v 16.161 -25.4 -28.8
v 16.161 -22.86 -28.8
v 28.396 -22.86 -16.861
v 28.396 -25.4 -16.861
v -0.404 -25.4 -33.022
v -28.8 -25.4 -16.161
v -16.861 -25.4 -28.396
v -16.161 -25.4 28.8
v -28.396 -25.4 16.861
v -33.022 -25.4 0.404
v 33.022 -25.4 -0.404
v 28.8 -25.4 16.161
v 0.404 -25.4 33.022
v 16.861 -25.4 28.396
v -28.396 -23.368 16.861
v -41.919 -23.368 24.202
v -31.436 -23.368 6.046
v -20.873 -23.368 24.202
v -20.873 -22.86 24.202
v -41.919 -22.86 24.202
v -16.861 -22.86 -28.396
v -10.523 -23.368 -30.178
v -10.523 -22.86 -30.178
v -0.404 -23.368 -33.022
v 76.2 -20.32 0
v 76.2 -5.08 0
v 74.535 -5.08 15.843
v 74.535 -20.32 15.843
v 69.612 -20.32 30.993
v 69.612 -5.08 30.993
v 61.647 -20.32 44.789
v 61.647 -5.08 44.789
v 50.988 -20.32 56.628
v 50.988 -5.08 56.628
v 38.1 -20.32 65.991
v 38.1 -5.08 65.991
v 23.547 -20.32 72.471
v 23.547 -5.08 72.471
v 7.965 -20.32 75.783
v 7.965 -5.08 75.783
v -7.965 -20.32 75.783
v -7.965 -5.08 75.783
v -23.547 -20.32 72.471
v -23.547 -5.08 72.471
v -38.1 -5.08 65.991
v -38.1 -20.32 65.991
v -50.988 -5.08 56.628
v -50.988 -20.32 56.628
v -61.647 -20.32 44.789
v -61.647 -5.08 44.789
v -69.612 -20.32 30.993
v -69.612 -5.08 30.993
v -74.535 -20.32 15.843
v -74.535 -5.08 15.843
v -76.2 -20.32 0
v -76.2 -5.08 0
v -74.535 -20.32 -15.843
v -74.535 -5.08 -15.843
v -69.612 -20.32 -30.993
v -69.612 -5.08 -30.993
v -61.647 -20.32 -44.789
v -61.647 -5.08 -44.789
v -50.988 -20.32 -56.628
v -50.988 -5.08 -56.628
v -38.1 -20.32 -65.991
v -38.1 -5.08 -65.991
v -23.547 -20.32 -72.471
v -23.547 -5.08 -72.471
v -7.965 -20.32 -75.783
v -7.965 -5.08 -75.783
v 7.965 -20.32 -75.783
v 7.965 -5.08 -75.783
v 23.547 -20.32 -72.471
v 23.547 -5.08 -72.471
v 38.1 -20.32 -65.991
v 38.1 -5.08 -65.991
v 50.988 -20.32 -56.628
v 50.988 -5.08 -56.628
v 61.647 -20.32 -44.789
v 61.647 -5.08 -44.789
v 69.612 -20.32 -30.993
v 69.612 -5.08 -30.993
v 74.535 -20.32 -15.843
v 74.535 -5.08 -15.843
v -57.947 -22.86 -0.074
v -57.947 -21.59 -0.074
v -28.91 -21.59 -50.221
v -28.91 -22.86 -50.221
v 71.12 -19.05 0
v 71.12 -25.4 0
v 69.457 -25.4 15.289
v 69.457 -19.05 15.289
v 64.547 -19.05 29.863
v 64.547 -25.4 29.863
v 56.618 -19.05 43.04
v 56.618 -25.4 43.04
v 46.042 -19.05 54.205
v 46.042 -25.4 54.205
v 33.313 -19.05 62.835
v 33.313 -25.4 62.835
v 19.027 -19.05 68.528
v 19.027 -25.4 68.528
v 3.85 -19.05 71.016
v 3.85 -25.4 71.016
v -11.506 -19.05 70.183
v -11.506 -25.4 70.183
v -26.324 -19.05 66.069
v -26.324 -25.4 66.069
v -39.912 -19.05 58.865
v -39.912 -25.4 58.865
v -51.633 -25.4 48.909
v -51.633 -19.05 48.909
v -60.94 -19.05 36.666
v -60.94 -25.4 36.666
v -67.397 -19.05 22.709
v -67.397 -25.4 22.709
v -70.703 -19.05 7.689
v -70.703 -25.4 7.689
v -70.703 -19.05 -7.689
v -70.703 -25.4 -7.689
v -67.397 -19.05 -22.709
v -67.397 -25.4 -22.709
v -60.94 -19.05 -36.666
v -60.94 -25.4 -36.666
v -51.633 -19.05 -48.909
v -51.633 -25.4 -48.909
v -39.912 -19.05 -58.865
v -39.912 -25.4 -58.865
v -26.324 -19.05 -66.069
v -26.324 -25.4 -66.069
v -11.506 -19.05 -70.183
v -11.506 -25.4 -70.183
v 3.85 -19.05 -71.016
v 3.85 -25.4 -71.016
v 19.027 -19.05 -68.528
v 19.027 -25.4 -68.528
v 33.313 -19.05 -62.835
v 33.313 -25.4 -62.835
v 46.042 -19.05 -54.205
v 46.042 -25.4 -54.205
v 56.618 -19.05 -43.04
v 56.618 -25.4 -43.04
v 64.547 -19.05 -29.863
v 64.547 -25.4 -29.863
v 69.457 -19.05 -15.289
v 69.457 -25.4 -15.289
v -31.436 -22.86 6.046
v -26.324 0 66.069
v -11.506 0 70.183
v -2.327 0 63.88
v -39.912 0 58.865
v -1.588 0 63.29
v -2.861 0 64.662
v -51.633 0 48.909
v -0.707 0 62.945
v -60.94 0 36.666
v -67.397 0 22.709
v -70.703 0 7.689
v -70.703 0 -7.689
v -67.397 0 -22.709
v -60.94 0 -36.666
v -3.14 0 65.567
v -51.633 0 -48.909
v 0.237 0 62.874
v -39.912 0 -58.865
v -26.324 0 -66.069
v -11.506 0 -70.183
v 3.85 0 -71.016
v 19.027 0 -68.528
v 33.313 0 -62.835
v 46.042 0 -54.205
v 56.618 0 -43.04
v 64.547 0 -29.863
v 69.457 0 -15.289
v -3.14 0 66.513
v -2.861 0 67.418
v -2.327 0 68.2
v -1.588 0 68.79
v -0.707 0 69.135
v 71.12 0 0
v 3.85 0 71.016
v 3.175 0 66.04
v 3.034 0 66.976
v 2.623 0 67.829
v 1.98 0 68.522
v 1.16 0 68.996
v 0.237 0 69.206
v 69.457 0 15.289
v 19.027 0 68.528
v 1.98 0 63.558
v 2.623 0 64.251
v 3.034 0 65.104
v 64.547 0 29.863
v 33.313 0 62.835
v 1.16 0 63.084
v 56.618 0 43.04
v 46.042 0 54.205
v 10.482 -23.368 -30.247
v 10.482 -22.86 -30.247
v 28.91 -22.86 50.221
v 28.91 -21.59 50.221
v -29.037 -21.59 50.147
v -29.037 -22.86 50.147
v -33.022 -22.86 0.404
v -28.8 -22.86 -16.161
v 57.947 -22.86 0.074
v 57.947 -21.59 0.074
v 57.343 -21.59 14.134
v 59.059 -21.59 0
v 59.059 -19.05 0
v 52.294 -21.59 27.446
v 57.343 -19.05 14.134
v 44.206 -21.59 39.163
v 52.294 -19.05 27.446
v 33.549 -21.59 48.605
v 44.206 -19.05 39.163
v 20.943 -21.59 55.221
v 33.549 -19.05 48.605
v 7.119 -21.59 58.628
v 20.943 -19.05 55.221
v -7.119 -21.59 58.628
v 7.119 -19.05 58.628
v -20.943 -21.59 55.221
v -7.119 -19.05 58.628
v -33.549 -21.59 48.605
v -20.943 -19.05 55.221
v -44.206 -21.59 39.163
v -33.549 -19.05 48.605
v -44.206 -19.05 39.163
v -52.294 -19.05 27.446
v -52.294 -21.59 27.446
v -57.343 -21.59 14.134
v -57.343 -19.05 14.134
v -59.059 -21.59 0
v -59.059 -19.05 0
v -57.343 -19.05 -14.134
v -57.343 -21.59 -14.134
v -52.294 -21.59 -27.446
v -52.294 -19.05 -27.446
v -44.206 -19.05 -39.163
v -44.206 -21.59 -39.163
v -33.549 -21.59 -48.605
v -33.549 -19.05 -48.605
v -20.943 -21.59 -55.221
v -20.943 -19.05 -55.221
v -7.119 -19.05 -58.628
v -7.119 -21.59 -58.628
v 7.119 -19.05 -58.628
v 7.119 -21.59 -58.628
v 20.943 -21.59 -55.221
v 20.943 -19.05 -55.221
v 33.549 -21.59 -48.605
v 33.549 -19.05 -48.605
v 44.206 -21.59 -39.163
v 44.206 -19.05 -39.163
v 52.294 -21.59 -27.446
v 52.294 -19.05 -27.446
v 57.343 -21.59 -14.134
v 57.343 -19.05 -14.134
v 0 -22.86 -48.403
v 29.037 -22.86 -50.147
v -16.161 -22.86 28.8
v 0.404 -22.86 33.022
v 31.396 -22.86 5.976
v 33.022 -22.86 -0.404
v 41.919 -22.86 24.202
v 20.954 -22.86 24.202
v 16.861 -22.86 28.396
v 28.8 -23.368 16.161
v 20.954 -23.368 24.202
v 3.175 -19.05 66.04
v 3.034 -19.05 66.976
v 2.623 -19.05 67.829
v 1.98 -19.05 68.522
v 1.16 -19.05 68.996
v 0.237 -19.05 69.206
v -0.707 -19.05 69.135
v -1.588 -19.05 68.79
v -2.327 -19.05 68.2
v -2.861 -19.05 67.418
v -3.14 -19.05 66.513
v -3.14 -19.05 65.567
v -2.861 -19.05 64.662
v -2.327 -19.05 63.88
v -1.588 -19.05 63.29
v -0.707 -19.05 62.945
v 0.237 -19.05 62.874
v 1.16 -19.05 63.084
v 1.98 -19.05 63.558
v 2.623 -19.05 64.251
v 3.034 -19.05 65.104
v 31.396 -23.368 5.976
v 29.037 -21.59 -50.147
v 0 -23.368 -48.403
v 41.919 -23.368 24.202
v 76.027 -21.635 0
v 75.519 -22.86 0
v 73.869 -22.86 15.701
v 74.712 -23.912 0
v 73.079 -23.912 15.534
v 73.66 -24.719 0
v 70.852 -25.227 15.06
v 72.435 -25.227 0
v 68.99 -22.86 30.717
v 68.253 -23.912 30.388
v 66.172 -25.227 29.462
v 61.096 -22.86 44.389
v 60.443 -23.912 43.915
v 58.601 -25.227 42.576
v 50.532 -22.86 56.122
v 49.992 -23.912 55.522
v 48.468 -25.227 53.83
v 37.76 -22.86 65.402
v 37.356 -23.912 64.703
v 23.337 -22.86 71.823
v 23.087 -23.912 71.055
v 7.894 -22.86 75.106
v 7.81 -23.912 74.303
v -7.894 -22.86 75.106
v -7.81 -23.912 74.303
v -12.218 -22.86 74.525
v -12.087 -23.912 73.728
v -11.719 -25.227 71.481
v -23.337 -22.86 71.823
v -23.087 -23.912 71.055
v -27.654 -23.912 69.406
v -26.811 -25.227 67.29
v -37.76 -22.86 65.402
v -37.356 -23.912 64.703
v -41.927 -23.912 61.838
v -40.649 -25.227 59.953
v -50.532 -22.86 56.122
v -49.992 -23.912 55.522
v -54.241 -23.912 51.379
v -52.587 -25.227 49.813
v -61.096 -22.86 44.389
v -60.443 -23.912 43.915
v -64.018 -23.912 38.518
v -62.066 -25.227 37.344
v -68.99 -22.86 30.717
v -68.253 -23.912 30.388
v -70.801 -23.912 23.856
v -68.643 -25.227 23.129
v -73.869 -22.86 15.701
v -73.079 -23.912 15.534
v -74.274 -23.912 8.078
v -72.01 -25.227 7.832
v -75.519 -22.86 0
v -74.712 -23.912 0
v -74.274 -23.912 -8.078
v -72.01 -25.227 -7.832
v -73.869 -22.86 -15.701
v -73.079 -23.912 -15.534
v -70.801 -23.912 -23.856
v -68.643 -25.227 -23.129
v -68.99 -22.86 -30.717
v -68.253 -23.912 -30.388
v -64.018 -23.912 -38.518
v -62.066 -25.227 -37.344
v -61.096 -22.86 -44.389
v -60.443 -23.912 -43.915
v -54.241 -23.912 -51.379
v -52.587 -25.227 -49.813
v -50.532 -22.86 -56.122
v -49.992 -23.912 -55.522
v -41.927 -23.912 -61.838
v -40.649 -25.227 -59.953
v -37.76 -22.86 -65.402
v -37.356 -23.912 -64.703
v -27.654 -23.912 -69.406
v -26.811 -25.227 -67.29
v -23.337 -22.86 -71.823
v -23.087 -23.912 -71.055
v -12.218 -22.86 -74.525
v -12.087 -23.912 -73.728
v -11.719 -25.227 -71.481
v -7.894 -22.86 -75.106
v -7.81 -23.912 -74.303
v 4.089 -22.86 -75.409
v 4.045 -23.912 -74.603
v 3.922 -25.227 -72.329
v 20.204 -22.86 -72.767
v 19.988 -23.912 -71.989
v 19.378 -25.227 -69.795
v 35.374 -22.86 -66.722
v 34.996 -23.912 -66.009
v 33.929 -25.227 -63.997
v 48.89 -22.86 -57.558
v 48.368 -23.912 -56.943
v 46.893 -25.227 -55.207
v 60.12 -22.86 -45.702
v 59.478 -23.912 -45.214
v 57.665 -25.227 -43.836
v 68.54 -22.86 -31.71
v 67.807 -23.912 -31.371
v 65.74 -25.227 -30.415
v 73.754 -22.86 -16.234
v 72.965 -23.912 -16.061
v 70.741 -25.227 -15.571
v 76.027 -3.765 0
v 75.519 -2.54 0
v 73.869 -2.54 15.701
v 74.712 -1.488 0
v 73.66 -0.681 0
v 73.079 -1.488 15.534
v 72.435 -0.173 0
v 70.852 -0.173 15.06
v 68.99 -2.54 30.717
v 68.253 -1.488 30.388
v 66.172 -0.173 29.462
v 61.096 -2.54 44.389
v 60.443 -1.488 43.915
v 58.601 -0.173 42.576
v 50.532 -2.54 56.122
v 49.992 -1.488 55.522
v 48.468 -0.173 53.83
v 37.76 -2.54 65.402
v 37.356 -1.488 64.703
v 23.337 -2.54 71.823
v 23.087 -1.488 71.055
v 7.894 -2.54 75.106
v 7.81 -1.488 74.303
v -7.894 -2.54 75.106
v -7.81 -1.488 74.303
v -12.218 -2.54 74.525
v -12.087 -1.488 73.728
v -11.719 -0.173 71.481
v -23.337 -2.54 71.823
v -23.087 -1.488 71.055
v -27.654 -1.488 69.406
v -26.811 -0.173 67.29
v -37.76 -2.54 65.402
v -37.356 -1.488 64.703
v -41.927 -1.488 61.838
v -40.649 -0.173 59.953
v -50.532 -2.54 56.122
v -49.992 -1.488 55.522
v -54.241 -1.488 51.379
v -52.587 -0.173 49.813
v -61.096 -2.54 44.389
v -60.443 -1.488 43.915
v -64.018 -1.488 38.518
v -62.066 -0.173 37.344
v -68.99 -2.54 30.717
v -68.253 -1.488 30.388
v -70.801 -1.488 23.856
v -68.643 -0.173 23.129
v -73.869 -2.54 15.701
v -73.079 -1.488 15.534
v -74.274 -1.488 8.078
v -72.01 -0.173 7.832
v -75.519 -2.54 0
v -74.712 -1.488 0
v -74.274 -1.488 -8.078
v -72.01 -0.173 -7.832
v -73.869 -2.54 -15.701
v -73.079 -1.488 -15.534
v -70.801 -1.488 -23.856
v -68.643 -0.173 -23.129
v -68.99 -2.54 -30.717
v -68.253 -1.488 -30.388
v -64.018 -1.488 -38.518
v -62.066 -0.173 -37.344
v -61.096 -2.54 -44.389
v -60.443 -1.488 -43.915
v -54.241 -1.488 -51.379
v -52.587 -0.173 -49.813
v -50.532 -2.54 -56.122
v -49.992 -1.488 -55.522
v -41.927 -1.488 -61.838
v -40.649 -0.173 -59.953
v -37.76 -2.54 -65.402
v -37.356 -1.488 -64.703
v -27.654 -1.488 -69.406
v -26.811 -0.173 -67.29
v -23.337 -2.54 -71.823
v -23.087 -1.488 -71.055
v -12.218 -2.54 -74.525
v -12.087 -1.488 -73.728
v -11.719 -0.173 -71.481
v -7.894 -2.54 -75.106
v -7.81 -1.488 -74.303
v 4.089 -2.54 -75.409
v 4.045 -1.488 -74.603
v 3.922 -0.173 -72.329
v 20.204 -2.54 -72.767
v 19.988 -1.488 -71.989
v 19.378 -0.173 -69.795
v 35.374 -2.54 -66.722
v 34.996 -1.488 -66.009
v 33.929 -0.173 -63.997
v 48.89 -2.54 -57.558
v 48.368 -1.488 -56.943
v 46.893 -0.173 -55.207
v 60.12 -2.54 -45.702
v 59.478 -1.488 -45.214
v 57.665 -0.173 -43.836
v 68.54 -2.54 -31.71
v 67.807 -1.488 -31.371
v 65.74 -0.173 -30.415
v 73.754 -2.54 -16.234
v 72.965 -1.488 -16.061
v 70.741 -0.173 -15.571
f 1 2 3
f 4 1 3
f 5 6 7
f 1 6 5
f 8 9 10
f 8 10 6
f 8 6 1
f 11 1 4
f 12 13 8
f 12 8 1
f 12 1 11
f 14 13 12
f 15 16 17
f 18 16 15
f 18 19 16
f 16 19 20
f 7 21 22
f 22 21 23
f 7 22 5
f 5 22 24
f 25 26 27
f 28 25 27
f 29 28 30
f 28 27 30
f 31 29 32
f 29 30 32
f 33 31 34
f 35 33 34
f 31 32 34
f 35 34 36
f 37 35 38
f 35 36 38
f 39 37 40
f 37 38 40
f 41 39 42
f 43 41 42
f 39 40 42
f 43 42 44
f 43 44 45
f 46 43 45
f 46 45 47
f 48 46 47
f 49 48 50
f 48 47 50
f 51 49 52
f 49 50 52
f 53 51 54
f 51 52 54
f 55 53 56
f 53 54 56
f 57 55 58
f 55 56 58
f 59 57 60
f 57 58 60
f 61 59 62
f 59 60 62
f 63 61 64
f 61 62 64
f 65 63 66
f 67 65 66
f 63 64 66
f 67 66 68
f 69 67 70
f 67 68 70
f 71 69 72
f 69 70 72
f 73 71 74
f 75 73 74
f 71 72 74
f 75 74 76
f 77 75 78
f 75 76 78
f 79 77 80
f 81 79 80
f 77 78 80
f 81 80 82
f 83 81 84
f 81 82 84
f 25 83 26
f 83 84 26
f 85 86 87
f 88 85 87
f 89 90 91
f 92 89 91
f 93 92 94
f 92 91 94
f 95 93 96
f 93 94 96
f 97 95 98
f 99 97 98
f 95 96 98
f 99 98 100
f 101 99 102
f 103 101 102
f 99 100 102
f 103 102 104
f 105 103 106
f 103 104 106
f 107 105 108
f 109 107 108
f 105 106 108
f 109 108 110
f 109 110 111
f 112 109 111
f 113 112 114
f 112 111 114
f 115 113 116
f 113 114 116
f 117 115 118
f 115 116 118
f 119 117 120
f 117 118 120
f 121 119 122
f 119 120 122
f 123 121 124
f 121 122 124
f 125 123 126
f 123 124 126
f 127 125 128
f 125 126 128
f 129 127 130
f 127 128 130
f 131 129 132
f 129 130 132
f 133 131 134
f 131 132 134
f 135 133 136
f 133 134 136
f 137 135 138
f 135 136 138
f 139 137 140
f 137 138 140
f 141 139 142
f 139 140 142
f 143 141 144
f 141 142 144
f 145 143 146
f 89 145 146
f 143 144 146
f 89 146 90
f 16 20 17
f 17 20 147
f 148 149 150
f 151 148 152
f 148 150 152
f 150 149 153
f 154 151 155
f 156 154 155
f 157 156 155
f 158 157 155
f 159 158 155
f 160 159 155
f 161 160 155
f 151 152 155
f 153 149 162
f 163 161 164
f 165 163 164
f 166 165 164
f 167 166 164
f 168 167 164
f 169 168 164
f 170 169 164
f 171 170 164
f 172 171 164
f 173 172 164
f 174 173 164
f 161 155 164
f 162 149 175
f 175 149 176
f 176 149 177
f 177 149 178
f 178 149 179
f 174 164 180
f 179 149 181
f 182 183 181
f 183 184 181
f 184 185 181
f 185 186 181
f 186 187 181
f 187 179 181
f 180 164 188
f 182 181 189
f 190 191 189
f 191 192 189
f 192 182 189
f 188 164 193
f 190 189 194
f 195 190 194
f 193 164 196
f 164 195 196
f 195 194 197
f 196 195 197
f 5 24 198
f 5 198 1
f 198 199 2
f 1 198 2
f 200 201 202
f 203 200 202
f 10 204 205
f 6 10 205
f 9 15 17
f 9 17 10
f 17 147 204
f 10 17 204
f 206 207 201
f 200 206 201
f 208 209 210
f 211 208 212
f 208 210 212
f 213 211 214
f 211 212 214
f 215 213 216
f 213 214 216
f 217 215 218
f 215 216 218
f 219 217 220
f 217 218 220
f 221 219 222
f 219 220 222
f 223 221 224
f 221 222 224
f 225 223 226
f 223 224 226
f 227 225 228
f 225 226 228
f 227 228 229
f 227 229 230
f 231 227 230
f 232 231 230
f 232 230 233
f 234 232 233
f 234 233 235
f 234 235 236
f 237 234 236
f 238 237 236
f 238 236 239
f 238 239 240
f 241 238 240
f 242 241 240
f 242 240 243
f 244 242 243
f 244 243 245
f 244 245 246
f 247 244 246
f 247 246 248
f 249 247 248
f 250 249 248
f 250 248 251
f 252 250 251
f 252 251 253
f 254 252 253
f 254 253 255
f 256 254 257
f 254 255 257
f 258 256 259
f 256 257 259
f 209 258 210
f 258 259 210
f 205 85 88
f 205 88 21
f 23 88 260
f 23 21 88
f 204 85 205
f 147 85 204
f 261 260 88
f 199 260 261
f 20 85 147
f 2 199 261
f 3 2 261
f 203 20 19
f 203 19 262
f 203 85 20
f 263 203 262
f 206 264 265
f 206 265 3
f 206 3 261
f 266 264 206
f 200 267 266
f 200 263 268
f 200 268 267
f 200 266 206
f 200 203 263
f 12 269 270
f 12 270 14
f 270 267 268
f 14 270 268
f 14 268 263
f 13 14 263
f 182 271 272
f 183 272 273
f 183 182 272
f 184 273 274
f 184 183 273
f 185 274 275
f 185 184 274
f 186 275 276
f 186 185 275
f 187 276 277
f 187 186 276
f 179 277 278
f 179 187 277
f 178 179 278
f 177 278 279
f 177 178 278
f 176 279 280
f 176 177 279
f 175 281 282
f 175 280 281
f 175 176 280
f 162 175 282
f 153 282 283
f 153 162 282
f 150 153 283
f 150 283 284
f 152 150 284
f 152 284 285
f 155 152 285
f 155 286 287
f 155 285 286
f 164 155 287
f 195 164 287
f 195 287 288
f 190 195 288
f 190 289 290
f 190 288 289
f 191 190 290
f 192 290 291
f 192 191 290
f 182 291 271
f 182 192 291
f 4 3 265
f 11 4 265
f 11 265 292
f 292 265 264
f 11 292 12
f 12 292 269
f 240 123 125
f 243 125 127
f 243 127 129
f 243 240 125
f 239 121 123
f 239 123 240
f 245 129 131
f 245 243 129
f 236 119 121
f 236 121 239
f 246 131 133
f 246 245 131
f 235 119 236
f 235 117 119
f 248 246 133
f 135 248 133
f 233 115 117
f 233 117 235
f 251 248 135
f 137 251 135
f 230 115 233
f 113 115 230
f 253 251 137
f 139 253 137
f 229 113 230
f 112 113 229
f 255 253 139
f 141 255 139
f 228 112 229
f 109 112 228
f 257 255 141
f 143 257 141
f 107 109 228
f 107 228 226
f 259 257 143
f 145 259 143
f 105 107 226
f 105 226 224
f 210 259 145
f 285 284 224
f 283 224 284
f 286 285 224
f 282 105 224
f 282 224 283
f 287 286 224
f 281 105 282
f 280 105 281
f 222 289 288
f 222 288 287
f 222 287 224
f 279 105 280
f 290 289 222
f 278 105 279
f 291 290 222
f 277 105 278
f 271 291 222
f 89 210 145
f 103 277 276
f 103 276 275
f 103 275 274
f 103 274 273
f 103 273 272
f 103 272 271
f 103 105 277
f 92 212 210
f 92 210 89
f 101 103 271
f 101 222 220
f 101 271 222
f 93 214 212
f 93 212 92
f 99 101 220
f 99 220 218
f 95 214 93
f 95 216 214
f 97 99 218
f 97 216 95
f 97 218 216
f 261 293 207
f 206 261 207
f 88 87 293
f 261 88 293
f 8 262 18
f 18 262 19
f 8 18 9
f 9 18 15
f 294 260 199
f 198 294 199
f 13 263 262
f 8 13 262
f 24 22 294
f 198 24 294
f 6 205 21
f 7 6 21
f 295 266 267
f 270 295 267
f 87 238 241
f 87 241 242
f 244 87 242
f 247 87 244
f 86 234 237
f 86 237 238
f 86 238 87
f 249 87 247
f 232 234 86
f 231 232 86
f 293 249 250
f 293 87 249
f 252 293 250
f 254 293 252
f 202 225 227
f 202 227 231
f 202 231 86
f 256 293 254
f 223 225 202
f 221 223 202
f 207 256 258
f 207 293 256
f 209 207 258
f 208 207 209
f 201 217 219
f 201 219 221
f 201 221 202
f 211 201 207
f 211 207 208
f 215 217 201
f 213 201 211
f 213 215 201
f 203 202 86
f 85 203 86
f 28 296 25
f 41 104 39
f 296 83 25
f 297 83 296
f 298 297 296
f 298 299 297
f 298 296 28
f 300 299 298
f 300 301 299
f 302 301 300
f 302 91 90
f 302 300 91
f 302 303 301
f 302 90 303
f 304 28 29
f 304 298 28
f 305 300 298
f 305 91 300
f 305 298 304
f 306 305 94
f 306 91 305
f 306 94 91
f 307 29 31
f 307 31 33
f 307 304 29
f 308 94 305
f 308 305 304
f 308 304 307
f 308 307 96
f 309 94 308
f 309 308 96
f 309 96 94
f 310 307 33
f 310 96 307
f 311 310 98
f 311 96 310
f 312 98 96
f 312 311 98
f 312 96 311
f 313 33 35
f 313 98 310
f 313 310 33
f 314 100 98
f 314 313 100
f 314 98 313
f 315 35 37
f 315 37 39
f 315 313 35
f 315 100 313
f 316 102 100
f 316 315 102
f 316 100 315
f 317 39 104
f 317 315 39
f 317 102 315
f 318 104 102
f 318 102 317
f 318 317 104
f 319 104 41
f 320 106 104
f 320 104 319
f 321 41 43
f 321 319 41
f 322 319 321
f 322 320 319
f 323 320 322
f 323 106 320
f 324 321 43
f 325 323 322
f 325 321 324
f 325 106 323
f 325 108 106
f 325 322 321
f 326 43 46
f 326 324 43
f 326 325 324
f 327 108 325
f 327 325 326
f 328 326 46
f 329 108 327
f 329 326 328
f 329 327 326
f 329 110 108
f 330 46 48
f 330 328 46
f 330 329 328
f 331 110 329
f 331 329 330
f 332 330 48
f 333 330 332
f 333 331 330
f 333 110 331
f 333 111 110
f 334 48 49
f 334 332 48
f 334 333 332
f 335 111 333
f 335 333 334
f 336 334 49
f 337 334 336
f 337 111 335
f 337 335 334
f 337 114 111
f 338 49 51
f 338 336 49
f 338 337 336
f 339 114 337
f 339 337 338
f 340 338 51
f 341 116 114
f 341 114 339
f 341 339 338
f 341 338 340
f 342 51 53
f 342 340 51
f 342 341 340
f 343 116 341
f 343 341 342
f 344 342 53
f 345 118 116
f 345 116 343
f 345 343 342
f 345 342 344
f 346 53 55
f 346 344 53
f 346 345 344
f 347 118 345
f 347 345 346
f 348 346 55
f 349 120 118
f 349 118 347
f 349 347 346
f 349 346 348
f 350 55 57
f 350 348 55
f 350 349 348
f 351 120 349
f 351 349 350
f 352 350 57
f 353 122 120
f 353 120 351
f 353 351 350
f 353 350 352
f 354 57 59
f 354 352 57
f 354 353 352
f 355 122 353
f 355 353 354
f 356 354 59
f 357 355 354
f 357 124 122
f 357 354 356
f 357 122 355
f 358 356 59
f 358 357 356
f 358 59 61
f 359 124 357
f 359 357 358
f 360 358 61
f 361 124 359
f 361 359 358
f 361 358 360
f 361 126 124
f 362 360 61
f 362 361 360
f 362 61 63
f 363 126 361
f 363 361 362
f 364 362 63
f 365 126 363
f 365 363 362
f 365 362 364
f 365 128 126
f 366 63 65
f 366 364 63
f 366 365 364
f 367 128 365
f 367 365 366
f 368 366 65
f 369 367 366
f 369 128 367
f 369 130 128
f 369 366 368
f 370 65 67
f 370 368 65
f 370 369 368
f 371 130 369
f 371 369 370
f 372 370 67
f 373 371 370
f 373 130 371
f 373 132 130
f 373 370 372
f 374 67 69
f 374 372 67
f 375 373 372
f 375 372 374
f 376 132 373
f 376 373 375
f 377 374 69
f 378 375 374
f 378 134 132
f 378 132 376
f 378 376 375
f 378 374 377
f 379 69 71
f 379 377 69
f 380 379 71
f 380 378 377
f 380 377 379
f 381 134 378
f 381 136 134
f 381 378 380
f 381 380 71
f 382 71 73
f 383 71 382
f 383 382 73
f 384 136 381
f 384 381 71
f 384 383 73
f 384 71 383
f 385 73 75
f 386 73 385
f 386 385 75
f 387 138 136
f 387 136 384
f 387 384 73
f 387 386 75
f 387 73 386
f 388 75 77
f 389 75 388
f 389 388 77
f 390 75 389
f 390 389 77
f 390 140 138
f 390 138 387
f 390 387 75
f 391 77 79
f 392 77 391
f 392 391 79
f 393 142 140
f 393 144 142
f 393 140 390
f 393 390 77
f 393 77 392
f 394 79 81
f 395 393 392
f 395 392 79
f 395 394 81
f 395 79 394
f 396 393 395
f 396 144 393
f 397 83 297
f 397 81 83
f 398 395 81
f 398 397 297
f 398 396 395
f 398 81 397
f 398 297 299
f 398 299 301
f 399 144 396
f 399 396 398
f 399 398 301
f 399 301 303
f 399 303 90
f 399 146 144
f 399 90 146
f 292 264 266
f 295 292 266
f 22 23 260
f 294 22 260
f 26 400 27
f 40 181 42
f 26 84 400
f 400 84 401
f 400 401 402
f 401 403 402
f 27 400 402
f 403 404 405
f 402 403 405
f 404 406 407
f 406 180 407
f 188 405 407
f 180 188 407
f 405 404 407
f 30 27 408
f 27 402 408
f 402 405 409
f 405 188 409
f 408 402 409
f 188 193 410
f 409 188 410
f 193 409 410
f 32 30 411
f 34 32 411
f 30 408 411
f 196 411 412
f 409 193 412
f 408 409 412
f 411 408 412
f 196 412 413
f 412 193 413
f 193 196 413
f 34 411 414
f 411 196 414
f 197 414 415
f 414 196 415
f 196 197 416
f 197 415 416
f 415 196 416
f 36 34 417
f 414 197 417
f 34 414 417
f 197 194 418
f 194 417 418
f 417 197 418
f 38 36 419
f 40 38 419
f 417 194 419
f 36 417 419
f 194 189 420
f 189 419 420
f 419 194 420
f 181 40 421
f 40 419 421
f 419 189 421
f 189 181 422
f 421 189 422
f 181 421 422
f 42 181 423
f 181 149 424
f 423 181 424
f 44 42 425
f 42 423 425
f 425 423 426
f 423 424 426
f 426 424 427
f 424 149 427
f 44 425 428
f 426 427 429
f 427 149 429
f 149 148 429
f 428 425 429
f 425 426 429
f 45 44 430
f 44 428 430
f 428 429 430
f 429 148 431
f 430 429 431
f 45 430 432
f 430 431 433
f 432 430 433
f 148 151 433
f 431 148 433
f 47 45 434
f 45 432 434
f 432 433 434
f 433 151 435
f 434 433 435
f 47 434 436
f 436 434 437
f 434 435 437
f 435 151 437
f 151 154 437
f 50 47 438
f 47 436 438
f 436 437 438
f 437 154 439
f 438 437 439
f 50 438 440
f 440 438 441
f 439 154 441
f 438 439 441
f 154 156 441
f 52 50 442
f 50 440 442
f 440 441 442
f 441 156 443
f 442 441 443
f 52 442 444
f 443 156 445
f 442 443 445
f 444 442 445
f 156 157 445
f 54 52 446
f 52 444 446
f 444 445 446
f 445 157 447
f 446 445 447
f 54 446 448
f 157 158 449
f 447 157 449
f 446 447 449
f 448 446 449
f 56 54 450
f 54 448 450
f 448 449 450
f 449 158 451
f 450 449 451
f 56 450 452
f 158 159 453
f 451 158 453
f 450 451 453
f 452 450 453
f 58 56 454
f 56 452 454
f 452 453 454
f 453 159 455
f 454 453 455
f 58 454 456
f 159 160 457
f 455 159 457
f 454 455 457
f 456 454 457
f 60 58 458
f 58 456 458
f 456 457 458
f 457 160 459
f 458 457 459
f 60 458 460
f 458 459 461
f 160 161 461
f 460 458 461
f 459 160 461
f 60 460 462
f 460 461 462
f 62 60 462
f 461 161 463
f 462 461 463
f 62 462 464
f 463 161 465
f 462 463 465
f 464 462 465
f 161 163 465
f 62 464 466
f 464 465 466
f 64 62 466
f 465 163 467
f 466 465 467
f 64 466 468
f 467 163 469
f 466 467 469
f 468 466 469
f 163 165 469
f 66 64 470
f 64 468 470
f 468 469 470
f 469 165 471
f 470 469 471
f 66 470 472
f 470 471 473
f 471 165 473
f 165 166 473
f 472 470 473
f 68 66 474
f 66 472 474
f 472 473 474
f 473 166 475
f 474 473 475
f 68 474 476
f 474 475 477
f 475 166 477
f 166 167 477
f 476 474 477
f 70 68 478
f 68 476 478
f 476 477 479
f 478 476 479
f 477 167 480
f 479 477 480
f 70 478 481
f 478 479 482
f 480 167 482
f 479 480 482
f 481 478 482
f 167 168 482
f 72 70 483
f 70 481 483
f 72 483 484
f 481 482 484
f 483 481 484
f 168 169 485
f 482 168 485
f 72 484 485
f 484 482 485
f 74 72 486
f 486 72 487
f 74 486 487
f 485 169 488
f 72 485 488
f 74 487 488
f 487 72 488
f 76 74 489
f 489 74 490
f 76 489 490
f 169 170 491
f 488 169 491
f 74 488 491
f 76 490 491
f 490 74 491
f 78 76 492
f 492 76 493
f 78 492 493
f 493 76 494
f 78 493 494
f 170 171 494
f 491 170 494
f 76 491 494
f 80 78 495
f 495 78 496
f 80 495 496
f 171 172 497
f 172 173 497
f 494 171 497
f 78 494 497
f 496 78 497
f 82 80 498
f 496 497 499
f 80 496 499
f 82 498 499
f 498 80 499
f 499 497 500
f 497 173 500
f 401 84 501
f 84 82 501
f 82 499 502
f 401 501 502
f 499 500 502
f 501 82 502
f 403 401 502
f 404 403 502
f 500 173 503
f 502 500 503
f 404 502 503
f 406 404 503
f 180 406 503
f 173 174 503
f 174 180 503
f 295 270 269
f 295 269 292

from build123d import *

# Parameters (mm, degrees)
F0_R      = 76.2
F1_DEPTH  = 25.4
F2_R      = 5.08
F1_FACE_R = 71.12
F3_DEPTH  = 6.35
F4_R      = 3.175
F5_DEPTH  = 25.4
F6_R      = 59.059026
F7_DEPTH  = 21.59
F9_DEPTH  = 22.86
F11_DEPTH = 23.368
F13_DEPTH = 25.4


with BuildPart() as f1:
    # F0 (on Front) → F1 (new body)
    with BuildSketch(Plane.XZ):
        Circle(F0_R)
    extrude(amount=F1_DEPTH)

    # F2
    f2_edges = [f1.edges().sort_by_distance(p)[0] for p in [
        (76.2, -12.7, 0),
        (-76.2, 0, 0),
        (-76.2, -25.4, 0),
    ]]
    fillet(f2_edges, radius=F2_R)

    # F1_face (on face) → F3 (cut)
    with BuildSketch(Plane.XZ.offset(25.4)):
        Circle(F1_FACE_R)
    extrude(amount=-F3_DEPTH, mode=Mode.SUBTRACT)

    # F4 (on Front) → F5 (cut)
    with BuildSketch(Plane.XZ):
        with Locations((0, 66.04)):
            Circle(F4_R)
    extrude(amount=F5_DEPTH, mode=Mode.SUBTRACT)

    # F6 (on Front) → F7 (join)
    with BuildSketch(Plane.XZ):
        Circle(F6_R)
    extrude(amount=F7_DEPTH)

    # F8 (on Front) → F9 (join)
    with BuildSketch(Plane.XZ):
        Polygon((29.037268, -50.146991), (57.947202, 0.073516), (28.909934, 50.220507), (-29.037268, 50.146991), (-57.947202, -0.073516), (-28.909934, -50.220507), align=None)
    extrude(amount=F9_DEPTH)

    # F10 (on Front) → F11 (join)
    with BuildSketch(Plane.XZ):
        Polygon((-41.918568, 24.201697), (0, -48.403393), (41.918568, 24.201697), align=None)
    extrude(amount=F11_DEPTH)

    # F12 (on Front) → F13 (join)
    with BuildSketch(Plane.XZ):
        Polygon((33.022074, -0.404168), (28.800039, 16.161017), (16.861057, 28.395871), (0.404168, 33.022074), (-16.161017, 28.800039), (-28.395871, 16.861057), (-33.022074, 0.404168), (-28.800039, -16.161017), (-16.861057, -28.395871), (-0.404168, -33.022074), (16.161017, -28.800039), (28.395871, -16.861057), align=None)
    extrude(amount=F13_DEPTH)


solid = f1.part
